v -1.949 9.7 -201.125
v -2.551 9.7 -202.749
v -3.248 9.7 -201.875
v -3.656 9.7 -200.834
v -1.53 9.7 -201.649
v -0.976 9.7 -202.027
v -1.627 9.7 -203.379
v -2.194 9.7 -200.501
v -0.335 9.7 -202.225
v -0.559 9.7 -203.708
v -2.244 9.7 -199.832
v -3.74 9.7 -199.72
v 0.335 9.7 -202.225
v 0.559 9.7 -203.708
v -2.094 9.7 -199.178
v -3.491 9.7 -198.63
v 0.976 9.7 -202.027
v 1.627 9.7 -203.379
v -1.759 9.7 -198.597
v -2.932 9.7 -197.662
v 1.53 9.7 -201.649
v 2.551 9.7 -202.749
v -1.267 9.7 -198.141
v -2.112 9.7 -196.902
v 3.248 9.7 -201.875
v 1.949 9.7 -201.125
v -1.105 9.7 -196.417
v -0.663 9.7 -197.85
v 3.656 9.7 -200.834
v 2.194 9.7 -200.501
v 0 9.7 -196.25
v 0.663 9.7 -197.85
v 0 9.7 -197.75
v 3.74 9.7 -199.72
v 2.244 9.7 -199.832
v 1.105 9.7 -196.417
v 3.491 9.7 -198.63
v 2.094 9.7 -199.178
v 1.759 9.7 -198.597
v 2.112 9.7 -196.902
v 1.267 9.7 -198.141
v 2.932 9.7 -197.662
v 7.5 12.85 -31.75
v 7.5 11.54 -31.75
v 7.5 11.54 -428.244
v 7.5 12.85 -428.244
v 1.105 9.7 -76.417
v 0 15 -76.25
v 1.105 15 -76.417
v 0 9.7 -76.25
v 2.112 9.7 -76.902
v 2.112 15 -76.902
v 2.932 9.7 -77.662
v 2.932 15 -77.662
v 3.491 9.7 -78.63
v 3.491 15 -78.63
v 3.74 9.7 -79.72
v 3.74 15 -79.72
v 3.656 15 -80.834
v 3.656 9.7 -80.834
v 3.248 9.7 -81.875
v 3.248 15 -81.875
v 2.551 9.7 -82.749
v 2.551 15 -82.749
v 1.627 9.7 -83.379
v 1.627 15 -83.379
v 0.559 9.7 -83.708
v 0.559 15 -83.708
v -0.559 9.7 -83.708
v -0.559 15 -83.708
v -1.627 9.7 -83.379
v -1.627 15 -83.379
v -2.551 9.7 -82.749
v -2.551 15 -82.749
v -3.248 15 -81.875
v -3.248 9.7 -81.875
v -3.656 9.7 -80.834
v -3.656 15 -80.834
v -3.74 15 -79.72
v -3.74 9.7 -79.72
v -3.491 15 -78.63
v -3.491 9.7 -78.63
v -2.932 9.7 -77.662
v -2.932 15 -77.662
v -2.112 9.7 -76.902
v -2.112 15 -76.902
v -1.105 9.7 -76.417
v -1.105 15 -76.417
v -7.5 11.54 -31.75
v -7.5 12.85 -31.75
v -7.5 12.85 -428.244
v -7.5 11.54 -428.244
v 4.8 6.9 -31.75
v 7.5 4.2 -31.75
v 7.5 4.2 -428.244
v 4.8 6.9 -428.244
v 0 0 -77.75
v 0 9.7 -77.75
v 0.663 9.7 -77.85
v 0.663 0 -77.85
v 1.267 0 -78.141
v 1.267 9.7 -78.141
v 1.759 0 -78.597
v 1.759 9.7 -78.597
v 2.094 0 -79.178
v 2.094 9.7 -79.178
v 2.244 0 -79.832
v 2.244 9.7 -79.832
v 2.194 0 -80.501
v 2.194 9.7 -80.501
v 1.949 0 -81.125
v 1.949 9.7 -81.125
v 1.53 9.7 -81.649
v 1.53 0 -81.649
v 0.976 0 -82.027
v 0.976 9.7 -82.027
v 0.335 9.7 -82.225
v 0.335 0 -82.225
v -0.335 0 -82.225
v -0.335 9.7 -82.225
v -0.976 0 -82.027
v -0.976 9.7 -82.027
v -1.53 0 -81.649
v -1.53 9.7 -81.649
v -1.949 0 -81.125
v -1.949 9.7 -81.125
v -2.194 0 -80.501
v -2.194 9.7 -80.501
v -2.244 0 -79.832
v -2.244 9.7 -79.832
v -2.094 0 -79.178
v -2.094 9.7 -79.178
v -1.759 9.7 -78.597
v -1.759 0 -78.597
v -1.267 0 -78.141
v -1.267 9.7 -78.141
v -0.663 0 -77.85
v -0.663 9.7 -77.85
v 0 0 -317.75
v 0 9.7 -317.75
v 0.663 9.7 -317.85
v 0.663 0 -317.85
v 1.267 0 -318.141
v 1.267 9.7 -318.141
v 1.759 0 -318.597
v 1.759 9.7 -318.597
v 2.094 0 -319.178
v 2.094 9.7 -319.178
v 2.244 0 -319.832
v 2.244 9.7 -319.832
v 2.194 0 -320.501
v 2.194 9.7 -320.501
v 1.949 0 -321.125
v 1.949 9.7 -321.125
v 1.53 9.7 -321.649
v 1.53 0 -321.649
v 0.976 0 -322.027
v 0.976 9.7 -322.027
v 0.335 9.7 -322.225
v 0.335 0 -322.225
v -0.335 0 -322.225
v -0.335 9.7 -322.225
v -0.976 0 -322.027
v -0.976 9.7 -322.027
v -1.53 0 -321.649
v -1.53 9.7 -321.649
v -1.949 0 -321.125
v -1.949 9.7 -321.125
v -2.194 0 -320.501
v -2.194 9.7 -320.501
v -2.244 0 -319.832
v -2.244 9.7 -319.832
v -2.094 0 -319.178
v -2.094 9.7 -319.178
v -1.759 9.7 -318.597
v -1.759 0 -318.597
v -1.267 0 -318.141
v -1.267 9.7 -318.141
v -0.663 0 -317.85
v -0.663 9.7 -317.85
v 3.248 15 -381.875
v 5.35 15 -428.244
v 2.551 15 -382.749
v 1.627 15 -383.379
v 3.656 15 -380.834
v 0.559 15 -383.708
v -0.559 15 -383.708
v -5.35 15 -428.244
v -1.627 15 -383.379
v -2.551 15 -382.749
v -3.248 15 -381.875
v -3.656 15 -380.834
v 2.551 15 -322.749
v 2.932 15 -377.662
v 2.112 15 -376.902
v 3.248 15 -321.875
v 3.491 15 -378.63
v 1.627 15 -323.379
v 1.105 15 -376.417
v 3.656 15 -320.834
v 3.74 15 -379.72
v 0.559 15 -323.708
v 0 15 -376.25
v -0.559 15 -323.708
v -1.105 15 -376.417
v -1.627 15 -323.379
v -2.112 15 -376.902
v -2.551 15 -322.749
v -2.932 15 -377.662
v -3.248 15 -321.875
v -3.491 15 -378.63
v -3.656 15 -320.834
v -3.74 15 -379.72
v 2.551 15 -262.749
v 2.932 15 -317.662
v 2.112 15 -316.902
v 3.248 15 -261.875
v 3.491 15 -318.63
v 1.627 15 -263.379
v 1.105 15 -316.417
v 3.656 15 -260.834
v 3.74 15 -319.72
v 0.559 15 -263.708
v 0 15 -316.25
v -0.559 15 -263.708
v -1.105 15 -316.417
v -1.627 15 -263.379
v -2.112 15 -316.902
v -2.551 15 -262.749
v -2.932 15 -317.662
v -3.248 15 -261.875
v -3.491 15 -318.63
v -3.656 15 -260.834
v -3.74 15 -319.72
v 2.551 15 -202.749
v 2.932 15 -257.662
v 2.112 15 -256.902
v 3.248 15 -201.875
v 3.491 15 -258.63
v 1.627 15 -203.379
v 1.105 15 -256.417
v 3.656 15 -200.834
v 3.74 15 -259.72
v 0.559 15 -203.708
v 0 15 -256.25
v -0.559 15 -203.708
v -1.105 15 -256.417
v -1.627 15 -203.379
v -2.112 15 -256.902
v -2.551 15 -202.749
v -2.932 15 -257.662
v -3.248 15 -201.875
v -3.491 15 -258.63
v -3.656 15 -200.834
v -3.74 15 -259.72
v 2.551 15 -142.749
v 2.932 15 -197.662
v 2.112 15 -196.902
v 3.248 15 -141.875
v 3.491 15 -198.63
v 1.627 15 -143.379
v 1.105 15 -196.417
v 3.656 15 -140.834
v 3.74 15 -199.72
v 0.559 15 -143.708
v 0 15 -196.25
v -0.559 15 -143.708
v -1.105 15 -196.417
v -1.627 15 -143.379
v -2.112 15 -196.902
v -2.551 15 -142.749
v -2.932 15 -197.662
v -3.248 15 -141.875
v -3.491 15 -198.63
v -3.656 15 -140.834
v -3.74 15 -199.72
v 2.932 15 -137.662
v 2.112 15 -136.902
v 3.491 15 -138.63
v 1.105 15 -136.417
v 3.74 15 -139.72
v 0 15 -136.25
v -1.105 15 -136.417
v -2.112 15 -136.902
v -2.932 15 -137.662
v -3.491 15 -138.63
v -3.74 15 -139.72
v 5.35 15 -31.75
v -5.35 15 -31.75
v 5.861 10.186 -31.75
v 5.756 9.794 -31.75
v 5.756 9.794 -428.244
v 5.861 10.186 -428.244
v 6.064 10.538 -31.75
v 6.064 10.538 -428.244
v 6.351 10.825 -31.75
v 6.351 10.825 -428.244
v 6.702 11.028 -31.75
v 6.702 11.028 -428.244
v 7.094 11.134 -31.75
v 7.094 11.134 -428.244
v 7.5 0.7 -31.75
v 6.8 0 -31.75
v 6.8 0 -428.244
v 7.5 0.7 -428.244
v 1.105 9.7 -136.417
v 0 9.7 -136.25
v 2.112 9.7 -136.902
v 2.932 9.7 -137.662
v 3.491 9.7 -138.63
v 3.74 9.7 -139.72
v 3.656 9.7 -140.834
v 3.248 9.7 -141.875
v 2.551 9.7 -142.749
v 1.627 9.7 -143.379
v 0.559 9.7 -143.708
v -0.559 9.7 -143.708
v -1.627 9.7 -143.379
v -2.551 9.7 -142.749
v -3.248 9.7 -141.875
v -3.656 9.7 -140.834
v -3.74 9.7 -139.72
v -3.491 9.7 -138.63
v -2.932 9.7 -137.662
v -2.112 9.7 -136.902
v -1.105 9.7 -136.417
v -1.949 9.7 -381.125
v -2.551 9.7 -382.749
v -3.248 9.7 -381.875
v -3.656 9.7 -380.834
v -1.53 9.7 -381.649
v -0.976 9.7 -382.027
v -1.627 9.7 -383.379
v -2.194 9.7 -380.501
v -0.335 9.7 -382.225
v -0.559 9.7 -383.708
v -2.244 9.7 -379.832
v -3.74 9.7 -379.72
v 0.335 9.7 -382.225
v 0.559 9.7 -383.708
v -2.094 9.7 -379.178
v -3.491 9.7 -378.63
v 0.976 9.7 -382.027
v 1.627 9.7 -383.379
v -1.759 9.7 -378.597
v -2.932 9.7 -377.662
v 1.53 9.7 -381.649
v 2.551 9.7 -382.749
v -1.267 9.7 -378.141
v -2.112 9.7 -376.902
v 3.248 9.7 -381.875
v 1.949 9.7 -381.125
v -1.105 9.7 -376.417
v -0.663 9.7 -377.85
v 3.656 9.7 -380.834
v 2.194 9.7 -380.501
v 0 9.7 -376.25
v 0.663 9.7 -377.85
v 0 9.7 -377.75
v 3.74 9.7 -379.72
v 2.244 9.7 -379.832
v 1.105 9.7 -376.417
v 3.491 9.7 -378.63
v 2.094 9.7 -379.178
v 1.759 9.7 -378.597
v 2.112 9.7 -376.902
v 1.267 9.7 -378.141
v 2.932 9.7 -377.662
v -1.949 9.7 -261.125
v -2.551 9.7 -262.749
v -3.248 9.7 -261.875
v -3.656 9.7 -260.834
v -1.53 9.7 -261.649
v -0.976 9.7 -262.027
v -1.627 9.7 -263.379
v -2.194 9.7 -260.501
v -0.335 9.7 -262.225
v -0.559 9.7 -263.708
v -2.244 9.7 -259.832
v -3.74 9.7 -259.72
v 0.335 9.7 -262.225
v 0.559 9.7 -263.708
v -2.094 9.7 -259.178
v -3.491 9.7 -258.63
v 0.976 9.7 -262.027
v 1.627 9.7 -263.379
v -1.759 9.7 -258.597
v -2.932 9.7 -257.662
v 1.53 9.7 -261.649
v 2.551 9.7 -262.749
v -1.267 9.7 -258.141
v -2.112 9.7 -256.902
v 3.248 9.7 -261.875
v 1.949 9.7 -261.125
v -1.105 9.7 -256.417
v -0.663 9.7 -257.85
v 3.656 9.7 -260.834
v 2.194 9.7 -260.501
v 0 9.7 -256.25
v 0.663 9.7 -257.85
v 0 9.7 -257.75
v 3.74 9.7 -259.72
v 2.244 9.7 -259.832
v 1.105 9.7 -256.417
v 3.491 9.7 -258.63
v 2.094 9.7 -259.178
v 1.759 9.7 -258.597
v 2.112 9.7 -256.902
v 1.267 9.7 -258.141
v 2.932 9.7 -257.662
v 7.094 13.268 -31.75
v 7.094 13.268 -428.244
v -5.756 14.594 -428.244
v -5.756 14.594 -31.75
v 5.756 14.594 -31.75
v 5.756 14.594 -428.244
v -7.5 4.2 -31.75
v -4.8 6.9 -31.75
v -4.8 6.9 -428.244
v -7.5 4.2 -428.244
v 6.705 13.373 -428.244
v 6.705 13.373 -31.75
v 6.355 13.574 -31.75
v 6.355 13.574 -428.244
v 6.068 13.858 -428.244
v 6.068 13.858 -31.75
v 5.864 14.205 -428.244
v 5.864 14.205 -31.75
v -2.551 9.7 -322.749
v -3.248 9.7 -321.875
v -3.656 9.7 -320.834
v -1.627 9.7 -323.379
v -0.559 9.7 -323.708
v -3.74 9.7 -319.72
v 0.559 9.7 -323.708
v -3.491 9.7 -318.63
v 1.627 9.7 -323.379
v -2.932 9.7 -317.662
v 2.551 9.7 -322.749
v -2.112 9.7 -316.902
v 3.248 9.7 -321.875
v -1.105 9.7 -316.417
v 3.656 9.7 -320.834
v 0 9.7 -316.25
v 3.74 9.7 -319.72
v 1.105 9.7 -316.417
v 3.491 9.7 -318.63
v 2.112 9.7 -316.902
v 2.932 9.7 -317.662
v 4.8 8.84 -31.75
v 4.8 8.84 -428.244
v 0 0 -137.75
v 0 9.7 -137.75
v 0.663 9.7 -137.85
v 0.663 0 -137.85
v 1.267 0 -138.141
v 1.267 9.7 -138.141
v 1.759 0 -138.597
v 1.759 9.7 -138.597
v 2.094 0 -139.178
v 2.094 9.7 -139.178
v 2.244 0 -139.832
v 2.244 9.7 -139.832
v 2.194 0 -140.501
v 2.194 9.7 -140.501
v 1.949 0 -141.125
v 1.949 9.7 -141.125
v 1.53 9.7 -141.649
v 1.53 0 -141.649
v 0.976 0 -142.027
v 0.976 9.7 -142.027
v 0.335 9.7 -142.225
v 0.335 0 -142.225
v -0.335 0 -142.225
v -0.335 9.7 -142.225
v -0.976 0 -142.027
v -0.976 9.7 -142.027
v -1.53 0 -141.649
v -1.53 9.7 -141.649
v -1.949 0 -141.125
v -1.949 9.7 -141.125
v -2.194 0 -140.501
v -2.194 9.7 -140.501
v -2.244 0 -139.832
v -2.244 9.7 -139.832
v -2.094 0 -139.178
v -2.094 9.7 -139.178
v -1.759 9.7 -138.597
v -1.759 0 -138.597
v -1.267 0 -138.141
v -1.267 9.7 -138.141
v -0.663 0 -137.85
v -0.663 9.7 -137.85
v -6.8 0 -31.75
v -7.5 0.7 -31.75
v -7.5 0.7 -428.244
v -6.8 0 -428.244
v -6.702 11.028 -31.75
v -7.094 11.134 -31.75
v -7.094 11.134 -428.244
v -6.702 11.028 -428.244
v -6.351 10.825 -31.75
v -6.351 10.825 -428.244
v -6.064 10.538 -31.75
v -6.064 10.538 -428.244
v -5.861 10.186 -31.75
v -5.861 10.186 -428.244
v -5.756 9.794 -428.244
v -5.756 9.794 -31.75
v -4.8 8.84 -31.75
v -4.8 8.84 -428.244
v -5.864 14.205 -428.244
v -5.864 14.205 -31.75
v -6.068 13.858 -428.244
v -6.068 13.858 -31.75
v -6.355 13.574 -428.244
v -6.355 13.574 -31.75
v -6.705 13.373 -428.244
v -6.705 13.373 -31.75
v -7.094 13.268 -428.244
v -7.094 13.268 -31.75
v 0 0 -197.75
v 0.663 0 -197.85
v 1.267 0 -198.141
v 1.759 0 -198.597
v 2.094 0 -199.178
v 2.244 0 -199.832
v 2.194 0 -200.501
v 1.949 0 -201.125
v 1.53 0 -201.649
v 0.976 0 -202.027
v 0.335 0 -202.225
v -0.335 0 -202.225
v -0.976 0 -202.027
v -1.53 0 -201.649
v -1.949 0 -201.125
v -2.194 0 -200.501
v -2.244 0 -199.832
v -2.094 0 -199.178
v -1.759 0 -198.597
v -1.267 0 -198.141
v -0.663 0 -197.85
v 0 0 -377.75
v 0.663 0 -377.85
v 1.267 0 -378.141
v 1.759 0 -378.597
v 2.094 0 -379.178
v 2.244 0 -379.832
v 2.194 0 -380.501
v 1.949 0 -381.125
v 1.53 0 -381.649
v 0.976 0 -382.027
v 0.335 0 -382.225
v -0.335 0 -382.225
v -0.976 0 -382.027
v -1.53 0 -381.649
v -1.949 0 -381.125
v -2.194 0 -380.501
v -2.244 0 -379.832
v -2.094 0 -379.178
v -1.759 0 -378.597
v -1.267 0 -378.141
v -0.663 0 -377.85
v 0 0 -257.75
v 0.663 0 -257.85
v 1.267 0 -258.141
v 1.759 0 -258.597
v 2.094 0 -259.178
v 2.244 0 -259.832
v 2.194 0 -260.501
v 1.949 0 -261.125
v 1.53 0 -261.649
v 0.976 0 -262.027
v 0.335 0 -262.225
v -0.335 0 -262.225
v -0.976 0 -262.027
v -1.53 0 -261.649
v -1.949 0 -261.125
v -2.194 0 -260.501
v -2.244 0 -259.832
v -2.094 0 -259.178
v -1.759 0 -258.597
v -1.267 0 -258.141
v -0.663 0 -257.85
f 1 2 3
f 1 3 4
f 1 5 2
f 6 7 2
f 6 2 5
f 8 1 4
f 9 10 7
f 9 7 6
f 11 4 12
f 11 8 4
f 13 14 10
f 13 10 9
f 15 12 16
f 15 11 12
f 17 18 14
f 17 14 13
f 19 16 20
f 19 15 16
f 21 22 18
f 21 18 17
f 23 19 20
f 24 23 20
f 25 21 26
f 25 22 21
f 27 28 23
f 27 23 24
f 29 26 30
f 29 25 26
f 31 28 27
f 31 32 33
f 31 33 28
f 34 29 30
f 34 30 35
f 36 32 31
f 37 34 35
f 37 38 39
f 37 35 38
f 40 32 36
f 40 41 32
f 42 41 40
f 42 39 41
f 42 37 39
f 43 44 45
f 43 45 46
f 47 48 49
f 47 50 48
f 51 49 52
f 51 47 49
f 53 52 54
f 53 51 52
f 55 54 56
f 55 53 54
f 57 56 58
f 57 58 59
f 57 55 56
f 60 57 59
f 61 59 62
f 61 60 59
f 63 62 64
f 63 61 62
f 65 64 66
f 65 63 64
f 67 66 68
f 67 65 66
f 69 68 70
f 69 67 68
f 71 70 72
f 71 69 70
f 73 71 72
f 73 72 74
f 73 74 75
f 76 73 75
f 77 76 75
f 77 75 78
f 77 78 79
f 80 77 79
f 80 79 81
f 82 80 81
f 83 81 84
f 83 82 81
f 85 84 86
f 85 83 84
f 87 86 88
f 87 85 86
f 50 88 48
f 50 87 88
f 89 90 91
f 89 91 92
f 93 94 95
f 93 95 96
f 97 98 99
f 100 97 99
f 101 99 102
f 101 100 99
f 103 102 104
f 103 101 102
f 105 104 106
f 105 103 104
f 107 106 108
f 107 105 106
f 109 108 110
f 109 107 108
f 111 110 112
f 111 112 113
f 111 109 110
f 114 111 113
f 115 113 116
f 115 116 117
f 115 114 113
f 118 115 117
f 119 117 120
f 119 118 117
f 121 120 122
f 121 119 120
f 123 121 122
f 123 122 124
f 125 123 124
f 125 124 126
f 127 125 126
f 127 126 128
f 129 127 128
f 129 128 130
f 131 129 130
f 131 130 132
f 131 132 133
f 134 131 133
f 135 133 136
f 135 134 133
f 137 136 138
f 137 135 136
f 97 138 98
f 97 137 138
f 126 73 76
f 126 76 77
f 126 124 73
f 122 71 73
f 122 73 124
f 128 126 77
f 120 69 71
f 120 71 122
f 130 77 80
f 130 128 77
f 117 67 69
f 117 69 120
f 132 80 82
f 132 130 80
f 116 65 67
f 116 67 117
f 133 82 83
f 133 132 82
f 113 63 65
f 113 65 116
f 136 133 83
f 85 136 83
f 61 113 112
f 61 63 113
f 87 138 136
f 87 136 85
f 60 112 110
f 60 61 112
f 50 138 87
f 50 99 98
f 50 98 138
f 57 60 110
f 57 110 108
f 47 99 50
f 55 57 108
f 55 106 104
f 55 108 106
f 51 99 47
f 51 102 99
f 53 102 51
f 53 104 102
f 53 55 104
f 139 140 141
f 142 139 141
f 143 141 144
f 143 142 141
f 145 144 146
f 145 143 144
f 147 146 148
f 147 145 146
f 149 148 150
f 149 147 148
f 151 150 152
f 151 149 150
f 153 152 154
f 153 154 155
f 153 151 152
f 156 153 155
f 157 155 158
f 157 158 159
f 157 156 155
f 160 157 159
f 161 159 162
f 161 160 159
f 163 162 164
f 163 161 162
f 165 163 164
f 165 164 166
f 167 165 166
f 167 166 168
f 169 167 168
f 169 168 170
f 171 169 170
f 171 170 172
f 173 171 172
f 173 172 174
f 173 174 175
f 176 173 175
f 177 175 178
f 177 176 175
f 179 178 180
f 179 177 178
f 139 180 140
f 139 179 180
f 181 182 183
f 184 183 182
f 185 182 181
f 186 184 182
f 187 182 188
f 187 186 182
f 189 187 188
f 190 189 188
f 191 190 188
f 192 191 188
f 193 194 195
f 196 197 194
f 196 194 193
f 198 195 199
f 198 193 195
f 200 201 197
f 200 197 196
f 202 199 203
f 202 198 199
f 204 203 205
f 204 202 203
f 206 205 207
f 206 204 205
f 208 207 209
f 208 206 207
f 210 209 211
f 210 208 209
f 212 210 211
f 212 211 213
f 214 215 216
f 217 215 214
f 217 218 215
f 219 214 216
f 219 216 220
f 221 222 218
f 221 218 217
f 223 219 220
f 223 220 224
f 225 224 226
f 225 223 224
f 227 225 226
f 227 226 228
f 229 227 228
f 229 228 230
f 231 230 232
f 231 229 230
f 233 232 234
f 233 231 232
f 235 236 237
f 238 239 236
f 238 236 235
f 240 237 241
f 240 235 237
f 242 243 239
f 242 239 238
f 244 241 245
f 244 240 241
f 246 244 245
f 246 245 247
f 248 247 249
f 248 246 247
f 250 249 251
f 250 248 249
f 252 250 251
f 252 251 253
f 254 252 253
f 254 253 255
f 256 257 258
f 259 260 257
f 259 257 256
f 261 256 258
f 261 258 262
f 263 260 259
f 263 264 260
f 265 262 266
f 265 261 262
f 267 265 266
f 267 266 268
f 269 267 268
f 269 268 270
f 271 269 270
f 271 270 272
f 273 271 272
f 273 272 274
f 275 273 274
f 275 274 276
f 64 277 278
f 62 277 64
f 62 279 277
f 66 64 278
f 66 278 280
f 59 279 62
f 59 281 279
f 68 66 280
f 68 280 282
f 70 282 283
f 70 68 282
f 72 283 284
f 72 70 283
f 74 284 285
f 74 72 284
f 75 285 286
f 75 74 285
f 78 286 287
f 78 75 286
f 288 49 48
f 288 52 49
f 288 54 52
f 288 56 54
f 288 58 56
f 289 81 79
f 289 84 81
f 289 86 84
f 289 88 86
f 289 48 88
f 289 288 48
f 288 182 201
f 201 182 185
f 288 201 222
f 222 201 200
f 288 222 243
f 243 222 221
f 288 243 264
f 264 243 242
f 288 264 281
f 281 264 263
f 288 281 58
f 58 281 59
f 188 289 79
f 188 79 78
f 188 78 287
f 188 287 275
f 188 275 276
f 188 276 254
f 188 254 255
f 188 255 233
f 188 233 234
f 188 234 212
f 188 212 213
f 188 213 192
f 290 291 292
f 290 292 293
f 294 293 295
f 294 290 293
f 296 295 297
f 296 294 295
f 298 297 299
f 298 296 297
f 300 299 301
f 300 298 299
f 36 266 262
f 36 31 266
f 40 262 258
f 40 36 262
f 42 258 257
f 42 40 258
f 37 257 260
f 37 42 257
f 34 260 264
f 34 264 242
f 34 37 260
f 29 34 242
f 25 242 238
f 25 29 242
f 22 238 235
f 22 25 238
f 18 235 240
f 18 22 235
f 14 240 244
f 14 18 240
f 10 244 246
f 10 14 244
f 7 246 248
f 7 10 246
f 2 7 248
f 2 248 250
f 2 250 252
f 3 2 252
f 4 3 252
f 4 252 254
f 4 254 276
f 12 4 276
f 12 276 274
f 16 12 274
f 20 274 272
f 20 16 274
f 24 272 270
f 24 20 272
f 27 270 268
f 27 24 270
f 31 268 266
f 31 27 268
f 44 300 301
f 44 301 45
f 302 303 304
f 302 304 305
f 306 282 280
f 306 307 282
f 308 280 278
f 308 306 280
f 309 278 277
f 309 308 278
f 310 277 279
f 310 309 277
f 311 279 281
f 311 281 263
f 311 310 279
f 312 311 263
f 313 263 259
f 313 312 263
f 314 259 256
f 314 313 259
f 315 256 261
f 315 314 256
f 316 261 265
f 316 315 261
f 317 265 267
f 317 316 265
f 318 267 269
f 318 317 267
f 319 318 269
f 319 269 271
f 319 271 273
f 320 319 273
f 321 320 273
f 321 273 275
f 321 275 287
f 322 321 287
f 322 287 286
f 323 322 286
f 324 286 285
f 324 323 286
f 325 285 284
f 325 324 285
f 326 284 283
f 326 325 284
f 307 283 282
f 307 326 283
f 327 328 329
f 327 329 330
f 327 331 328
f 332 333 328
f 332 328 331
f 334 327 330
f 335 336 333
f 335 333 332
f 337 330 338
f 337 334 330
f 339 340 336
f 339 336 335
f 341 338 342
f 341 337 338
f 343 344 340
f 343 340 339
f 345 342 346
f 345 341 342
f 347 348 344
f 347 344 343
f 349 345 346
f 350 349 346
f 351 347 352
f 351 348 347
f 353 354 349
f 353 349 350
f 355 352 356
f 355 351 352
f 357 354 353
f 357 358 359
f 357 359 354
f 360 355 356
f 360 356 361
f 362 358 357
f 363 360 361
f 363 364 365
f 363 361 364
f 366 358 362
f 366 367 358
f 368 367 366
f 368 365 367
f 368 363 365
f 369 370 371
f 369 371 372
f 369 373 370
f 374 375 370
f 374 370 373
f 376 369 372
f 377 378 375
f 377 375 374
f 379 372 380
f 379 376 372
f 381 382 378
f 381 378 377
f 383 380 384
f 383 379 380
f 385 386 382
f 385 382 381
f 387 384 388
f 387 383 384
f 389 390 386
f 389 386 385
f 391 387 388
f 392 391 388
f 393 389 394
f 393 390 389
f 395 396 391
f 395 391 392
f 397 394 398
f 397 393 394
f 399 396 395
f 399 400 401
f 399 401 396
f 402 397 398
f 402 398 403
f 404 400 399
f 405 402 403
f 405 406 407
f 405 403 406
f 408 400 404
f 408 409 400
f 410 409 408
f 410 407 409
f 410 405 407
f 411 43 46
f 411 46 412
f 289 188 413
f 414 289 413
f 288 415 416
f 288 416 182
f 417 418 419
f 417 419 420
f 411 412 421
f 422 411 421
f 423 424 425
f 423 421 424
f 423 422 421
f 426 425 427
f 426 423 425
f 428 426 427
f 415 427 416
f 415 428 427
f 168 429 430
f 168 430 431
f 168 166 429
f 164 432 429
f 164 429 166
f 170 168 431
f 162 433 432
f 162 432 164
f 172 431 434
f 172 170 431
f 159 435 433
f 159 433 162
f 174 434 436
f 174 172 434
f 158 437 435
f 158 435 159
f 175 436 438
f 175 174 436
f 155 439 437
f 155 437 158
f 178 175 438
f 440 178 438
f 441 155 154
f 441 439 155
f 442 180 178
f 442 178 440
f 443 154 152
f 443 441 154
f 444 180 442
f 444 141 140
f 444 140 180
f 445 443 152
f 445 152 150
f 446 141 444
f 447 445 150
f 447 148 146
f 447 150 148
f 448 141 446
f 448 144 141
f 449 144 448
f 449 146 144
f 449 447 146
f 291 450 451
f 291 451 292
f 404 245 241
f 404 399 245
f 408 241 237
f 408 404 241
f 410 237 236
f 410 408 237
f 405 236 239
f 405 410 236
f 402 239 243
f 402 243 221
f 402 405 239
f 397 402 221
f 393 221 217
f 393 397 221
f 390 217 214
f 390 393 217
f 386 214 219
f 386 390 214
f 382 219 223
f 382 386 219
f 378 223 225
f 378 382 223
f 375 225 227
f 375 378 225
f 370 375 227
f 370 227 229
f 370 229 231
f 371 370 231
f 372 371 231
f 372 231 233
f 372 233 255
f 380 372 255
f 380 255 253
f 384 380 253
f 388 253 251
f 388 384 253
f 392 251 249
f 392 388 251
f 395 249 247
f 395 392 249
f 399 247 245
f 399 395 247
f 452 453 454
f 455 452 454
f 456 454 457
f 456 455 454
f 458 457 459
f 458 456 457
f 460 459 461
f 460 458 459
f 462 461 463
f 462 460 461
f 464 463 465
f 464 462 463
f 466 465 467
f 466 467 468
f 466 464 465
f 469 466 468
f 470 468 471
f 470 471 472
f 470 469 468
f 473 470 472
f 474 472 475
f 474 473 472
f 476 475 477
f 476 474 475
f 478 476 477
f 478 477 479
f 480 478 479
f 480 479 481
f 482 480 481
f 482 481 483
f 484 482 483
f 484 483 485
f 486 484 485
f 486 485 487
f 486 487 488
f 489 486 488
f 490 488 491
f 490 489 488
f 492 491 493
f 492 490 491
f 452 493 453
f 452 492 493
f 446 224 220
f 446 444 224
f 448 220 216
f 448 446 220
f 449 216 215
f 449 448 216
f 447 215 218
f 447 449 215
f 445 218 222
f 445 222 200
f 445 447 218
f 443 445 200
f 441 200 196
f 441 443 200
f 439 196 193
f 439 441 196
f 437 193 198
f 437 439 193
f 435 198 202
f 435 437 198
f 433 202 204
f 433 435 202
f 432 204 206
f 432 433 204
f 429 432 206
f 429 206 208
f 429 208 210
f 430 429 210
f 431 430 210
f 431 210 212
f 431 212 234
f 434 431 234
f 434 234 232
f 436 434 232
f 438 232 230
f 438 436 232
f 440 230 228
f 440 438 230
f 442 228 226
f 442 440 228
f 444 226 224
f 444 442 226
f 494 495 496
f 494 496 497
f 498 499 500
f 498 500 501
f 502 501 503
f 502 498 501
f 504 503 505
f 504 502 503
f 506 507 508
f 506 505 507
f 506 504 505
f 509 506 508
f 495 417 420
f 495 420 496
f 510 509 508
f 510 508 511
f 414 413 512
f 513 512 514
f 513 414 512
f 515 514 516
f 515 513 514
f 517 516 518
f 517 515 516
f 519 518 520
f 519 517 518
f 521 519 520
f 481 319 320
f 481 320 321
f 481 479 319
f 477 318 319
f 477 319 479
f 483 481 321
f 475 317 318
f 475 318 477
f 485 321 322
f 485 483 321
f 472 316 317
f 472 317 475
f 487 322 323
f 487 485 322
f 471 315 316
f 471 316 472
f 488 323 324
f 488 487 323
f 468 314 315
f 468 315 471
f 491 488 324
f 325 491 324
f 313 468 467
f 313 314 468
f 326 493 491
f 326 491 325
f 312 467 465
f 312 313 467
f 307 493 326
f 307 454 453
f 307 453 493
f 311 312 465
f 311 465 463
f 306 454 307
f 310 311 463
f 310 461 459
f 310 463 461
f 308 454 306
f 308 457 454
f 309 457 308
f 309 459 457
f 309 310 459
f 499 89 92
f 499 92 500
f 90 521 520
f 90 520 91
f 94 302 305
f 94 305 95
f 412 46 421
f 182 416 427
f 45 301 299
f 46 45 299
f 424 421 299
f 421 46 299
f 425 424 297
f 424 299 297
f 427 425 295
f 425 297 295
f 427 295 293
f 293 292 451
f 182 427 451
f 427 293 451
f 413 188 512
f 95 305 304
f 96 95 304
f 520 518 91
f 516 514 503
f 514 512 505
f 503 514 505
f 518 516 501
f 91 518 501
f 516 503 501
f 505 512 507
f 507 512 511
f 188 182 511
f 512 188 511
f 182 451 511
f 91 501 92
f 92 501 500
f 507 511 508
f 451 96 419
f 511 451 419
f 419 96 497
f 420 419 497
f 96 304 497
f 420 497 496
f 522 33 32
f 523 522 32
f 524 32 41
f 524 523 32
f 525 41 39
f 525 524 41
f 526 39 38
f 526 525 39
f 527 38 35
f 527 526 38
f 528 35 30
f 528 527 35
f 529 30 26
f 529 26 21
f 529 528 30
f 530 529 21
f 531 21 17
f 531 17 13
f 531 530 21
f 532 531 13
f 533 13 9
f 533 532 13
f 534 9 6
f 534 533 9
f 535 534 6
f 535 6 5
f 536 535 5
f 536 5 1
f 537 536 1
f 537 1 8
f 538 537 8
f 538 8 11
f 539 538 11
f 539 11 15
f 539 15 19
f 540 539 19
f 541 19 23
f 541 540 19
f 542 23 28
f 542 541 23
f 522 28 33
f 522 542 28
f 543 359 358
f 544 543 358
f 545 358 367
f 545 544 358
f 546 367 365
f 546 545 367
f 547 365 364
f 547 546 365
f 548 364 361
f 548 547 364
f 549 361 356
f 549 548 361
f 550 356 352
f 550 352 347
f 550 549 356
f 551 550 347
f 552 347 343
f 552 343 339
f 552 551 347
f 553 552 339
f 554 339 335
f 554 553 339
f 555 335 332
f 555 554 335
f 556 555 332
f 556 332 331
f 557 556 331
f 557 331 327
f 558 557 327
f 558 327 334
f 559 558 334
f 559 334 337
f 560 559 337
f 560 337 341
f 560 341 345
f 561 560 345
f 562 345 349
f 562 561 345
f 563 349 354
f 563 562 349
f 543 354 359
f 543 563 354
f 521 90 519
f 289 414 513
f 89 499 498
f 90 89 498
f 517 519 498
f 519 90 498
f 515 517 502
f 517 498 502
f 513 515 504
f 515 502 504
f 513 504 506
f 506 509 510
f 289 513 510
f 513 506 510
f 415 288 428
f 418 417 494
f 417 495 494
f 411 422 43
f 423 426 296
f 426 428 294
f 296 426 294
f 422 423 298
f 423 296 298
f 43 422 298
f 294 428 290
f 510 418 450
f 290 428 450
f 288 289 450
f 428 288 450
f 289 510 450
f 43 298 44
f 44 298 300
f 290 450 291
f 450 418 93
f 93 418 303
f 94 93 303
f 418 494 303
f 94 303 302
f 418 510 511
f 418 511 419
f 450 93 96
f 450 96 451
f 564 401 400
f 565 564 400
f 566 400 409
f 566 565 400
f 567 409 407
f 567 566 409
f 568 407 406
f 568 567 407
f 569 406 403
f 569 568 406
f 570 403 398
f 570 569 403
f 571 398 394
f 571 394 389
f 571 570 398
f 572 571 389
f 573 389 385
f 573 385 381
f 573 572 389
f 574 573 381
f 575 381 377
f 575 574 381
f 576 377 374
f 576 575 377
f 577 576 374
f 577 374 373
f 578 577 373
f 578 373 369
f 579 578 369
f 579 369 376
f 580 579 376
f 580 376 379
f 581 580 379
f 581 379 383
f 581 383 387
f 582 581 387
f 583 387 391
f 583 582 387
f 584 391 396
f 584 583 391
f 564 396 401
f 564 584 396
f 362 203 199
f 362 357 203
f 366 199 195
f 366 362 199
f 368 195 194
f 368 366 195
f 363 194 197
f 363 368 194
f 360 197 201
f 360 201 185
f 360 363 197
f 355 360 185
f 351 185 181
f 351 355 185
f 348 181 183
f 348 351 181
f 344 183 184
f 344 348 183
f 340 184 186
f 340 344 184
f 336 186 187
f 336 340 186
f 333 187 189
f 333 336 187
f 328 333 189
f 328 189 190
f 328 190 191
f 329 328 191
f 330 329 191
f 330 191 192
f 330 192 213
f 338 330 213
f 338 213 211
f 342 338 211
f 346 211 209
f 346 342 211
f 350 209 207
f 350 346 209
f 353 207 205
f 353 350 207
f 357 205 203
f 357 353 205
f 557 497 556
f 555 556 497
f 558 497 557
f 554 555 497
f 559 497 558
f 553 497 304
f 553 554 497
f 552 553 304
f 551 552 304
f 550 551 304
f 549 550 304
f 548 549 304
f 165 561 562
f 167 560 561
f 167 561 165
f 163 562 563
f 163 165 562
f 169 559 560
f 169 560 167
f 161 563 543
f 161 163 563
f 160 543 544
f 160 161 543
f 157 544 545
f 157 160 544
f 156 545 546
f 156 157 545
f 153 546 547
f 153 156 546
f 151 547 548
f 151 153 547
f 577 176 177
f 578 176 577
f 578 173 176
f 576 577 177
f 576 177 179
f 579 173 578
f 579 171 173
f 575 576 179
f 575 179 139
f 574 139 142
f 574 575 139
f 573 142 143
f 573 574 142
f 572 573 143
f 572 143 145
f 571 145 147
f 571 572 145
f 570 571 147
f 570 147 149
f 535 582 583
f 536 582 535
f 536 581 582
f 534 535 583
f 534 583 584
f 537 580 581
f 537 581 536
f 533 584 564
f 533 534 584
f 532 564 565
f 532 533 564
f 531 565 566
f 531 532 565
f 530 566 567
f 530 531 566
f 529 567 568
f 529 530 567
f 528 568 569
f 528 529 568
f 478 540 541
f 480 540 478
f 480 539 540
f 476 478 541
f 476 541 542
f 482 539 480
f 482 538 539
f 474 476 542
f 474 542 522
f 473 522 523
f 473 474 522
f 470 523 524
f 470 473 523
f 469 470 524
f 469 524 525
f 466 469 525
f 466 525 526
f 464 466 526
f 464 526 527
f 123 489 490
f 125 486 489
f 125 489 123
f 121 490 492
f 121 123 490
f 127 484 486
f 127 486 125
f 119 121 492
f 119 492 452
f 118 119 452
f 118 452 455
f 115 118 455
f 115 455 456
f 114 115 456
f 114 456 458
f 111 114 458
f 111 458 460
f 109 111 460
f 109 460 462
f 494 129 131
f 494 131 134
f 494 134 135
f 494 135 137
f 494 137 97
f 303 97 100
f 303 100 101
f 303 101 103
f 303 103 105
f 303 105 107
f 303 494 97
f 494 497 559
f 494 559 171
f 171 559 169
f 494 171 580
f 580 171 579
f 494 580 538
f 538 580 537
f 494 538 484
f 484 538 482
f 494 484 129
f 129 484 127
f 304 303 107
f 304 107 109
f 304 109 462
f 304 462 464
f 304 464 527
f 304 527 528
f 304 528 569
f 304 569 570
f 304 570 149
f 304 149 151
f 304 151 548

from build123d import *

# Parameters (mm, degrees)
EXTRUDE1_DEPTH     = 460
LPATTERN1_COUNT    = 8
LPATTERN1_PITCH    = 60
SKETCH3_W          = 35.37212132
SKETCH3_H          = 31.75
SKETCH3_R          = 2.25
SKETCH3_W_2        = 31.665058017
SKETCH3_H_2        = 47.763491712
CUT_EXTRUDE1_DEPTH = 461.305605006


with BuildPart() as part:
    # Sketch1 → Extrude1 (new body)
    with BuildSketch(Plane(origin=(-20, 0, 0), x_dir=(1, 0, 0), z_dir=(0, 0, 1))):
        with BuildLine():
            Line((12.5, 0.69999271), (13.199992786, 0))
            Line((13.199992786, 0), (26.800007214, 0))
            Line((26.800007214, 0), (27.5, 0.69999271))
            Line((27.5, 0.69999271), (27.5, 4.2000246))
            Line((27.5, 4.2000246), (24.8000183, 6.9000063))
            Line((24.8000183, 6.9000063), (24.8000183, 8.8400054))
            Line((24.8000183, 8.8400054), (25.755946813, 9.794179118))
            ThreePointArc((25.755946813, 9.794179118), (26.198484624, 10.690600567), (27.09432569, 11.13431209))
            Line((27.09432569, 11.13431209), (27.5, 11.5399866))
            Line((27.5, 11.5399866), (27.5, 12.8500204))
            Line((27.5, 12.8500204), (27.09432569, 13.268442751))
            ThreePointArc((27.09432569, 13.268442751), (26.202460867, 13.706434947), (25.755946813, 14.594063938))
            Line((25.755946813, 14.594063938), (25.3500197, 15))
            Line((25.3500197, 15), (14.6499803, 15))
            Line((14.6499803, 15), (14.244053187, 14.594063938))
            ThreePointArc((14.244053187, 14.594063938), (13.797539133, 13.706434947), (12.90567431, 13.268442751))
            Line((12.90567431, 13.268442751), (12.5, 12.8500204))
            Line((12.5, 12.8500204), (12.5, 11.5399866))
            Line((12.5, 11.5399866), (12.90567431, 11.13431209))
            ThreePointArc((12.90567431, 11.13431209), (13.801515376, 10.690600567), (14.244053187, 9.794179118))
            Line((14.244053187, 9.794179118), (15.1999817, 8.8400054))
            Line((15.1999817, 8.8400054), (15.1999817, 6.9000063))
            Line((15.1999817, 6.9000063), (12.5, 4.2000246))
            Line((12.5, 4.2000246), (12.5, 0.69999271))
        make_face()
    extrude(amount=-EXTRUDE1_DEPTH)

    # Sketch2 → Cut-Revolve1 (revolve, cut)
    with BuildSketch(Plane(origin=(0, 0, 0), x_dir=(0, 0, -1), z_dir=(1, 0, 0))):
        Polygon((20, 15), (23.75, 15), (23.75, 9.7), (22.25, 9.7), (22.25, 0), (20, 0), align=None)
    cut_revolve1 = revolve(axis=Axis((0, 0, -20), (0, 1, 0)), mode=Mode.SUBTRACT)

    # LPattern1: Cut-Revolve1 ×8
    with Locations(*[(0, 0, -i * LPATTERN1_PITCH) for i in range(1, LPATTERN1_COUNT)]):
        add(cut_revolve1, mode=Mode.SUBTRACT)

    # Sketch3 → Cut-Extrude1 (cut, through all)
    # profile 1 of 2: a face of its own
    with BuildSketch(Plane.XZ):
        with Locations((-3.184714061, -15.875)):
            Rectangle(SKETCH3_W, SKETCH3_H)
        with Locations((0, -20)):
            Circle(SKETCH3_R, mode=Mode.SUBTRACT)
    # profile 2 of 2: a face of its own
    with BuildSketch(Plane.XZ):
        with Locations((-1.33118241, -452.125745856)):
            Rectangle(SKETCH3_W_2, SKETCH3_H_2)
        with Locations((0, -440)):
            Circle(SKETCH3_R, mode=Mode.SUBTRACT)
    extrude(amount=-CUT_EXTRUDE1_DEPTH, mode=Mode.SUBTRACT)


solid = part.part
